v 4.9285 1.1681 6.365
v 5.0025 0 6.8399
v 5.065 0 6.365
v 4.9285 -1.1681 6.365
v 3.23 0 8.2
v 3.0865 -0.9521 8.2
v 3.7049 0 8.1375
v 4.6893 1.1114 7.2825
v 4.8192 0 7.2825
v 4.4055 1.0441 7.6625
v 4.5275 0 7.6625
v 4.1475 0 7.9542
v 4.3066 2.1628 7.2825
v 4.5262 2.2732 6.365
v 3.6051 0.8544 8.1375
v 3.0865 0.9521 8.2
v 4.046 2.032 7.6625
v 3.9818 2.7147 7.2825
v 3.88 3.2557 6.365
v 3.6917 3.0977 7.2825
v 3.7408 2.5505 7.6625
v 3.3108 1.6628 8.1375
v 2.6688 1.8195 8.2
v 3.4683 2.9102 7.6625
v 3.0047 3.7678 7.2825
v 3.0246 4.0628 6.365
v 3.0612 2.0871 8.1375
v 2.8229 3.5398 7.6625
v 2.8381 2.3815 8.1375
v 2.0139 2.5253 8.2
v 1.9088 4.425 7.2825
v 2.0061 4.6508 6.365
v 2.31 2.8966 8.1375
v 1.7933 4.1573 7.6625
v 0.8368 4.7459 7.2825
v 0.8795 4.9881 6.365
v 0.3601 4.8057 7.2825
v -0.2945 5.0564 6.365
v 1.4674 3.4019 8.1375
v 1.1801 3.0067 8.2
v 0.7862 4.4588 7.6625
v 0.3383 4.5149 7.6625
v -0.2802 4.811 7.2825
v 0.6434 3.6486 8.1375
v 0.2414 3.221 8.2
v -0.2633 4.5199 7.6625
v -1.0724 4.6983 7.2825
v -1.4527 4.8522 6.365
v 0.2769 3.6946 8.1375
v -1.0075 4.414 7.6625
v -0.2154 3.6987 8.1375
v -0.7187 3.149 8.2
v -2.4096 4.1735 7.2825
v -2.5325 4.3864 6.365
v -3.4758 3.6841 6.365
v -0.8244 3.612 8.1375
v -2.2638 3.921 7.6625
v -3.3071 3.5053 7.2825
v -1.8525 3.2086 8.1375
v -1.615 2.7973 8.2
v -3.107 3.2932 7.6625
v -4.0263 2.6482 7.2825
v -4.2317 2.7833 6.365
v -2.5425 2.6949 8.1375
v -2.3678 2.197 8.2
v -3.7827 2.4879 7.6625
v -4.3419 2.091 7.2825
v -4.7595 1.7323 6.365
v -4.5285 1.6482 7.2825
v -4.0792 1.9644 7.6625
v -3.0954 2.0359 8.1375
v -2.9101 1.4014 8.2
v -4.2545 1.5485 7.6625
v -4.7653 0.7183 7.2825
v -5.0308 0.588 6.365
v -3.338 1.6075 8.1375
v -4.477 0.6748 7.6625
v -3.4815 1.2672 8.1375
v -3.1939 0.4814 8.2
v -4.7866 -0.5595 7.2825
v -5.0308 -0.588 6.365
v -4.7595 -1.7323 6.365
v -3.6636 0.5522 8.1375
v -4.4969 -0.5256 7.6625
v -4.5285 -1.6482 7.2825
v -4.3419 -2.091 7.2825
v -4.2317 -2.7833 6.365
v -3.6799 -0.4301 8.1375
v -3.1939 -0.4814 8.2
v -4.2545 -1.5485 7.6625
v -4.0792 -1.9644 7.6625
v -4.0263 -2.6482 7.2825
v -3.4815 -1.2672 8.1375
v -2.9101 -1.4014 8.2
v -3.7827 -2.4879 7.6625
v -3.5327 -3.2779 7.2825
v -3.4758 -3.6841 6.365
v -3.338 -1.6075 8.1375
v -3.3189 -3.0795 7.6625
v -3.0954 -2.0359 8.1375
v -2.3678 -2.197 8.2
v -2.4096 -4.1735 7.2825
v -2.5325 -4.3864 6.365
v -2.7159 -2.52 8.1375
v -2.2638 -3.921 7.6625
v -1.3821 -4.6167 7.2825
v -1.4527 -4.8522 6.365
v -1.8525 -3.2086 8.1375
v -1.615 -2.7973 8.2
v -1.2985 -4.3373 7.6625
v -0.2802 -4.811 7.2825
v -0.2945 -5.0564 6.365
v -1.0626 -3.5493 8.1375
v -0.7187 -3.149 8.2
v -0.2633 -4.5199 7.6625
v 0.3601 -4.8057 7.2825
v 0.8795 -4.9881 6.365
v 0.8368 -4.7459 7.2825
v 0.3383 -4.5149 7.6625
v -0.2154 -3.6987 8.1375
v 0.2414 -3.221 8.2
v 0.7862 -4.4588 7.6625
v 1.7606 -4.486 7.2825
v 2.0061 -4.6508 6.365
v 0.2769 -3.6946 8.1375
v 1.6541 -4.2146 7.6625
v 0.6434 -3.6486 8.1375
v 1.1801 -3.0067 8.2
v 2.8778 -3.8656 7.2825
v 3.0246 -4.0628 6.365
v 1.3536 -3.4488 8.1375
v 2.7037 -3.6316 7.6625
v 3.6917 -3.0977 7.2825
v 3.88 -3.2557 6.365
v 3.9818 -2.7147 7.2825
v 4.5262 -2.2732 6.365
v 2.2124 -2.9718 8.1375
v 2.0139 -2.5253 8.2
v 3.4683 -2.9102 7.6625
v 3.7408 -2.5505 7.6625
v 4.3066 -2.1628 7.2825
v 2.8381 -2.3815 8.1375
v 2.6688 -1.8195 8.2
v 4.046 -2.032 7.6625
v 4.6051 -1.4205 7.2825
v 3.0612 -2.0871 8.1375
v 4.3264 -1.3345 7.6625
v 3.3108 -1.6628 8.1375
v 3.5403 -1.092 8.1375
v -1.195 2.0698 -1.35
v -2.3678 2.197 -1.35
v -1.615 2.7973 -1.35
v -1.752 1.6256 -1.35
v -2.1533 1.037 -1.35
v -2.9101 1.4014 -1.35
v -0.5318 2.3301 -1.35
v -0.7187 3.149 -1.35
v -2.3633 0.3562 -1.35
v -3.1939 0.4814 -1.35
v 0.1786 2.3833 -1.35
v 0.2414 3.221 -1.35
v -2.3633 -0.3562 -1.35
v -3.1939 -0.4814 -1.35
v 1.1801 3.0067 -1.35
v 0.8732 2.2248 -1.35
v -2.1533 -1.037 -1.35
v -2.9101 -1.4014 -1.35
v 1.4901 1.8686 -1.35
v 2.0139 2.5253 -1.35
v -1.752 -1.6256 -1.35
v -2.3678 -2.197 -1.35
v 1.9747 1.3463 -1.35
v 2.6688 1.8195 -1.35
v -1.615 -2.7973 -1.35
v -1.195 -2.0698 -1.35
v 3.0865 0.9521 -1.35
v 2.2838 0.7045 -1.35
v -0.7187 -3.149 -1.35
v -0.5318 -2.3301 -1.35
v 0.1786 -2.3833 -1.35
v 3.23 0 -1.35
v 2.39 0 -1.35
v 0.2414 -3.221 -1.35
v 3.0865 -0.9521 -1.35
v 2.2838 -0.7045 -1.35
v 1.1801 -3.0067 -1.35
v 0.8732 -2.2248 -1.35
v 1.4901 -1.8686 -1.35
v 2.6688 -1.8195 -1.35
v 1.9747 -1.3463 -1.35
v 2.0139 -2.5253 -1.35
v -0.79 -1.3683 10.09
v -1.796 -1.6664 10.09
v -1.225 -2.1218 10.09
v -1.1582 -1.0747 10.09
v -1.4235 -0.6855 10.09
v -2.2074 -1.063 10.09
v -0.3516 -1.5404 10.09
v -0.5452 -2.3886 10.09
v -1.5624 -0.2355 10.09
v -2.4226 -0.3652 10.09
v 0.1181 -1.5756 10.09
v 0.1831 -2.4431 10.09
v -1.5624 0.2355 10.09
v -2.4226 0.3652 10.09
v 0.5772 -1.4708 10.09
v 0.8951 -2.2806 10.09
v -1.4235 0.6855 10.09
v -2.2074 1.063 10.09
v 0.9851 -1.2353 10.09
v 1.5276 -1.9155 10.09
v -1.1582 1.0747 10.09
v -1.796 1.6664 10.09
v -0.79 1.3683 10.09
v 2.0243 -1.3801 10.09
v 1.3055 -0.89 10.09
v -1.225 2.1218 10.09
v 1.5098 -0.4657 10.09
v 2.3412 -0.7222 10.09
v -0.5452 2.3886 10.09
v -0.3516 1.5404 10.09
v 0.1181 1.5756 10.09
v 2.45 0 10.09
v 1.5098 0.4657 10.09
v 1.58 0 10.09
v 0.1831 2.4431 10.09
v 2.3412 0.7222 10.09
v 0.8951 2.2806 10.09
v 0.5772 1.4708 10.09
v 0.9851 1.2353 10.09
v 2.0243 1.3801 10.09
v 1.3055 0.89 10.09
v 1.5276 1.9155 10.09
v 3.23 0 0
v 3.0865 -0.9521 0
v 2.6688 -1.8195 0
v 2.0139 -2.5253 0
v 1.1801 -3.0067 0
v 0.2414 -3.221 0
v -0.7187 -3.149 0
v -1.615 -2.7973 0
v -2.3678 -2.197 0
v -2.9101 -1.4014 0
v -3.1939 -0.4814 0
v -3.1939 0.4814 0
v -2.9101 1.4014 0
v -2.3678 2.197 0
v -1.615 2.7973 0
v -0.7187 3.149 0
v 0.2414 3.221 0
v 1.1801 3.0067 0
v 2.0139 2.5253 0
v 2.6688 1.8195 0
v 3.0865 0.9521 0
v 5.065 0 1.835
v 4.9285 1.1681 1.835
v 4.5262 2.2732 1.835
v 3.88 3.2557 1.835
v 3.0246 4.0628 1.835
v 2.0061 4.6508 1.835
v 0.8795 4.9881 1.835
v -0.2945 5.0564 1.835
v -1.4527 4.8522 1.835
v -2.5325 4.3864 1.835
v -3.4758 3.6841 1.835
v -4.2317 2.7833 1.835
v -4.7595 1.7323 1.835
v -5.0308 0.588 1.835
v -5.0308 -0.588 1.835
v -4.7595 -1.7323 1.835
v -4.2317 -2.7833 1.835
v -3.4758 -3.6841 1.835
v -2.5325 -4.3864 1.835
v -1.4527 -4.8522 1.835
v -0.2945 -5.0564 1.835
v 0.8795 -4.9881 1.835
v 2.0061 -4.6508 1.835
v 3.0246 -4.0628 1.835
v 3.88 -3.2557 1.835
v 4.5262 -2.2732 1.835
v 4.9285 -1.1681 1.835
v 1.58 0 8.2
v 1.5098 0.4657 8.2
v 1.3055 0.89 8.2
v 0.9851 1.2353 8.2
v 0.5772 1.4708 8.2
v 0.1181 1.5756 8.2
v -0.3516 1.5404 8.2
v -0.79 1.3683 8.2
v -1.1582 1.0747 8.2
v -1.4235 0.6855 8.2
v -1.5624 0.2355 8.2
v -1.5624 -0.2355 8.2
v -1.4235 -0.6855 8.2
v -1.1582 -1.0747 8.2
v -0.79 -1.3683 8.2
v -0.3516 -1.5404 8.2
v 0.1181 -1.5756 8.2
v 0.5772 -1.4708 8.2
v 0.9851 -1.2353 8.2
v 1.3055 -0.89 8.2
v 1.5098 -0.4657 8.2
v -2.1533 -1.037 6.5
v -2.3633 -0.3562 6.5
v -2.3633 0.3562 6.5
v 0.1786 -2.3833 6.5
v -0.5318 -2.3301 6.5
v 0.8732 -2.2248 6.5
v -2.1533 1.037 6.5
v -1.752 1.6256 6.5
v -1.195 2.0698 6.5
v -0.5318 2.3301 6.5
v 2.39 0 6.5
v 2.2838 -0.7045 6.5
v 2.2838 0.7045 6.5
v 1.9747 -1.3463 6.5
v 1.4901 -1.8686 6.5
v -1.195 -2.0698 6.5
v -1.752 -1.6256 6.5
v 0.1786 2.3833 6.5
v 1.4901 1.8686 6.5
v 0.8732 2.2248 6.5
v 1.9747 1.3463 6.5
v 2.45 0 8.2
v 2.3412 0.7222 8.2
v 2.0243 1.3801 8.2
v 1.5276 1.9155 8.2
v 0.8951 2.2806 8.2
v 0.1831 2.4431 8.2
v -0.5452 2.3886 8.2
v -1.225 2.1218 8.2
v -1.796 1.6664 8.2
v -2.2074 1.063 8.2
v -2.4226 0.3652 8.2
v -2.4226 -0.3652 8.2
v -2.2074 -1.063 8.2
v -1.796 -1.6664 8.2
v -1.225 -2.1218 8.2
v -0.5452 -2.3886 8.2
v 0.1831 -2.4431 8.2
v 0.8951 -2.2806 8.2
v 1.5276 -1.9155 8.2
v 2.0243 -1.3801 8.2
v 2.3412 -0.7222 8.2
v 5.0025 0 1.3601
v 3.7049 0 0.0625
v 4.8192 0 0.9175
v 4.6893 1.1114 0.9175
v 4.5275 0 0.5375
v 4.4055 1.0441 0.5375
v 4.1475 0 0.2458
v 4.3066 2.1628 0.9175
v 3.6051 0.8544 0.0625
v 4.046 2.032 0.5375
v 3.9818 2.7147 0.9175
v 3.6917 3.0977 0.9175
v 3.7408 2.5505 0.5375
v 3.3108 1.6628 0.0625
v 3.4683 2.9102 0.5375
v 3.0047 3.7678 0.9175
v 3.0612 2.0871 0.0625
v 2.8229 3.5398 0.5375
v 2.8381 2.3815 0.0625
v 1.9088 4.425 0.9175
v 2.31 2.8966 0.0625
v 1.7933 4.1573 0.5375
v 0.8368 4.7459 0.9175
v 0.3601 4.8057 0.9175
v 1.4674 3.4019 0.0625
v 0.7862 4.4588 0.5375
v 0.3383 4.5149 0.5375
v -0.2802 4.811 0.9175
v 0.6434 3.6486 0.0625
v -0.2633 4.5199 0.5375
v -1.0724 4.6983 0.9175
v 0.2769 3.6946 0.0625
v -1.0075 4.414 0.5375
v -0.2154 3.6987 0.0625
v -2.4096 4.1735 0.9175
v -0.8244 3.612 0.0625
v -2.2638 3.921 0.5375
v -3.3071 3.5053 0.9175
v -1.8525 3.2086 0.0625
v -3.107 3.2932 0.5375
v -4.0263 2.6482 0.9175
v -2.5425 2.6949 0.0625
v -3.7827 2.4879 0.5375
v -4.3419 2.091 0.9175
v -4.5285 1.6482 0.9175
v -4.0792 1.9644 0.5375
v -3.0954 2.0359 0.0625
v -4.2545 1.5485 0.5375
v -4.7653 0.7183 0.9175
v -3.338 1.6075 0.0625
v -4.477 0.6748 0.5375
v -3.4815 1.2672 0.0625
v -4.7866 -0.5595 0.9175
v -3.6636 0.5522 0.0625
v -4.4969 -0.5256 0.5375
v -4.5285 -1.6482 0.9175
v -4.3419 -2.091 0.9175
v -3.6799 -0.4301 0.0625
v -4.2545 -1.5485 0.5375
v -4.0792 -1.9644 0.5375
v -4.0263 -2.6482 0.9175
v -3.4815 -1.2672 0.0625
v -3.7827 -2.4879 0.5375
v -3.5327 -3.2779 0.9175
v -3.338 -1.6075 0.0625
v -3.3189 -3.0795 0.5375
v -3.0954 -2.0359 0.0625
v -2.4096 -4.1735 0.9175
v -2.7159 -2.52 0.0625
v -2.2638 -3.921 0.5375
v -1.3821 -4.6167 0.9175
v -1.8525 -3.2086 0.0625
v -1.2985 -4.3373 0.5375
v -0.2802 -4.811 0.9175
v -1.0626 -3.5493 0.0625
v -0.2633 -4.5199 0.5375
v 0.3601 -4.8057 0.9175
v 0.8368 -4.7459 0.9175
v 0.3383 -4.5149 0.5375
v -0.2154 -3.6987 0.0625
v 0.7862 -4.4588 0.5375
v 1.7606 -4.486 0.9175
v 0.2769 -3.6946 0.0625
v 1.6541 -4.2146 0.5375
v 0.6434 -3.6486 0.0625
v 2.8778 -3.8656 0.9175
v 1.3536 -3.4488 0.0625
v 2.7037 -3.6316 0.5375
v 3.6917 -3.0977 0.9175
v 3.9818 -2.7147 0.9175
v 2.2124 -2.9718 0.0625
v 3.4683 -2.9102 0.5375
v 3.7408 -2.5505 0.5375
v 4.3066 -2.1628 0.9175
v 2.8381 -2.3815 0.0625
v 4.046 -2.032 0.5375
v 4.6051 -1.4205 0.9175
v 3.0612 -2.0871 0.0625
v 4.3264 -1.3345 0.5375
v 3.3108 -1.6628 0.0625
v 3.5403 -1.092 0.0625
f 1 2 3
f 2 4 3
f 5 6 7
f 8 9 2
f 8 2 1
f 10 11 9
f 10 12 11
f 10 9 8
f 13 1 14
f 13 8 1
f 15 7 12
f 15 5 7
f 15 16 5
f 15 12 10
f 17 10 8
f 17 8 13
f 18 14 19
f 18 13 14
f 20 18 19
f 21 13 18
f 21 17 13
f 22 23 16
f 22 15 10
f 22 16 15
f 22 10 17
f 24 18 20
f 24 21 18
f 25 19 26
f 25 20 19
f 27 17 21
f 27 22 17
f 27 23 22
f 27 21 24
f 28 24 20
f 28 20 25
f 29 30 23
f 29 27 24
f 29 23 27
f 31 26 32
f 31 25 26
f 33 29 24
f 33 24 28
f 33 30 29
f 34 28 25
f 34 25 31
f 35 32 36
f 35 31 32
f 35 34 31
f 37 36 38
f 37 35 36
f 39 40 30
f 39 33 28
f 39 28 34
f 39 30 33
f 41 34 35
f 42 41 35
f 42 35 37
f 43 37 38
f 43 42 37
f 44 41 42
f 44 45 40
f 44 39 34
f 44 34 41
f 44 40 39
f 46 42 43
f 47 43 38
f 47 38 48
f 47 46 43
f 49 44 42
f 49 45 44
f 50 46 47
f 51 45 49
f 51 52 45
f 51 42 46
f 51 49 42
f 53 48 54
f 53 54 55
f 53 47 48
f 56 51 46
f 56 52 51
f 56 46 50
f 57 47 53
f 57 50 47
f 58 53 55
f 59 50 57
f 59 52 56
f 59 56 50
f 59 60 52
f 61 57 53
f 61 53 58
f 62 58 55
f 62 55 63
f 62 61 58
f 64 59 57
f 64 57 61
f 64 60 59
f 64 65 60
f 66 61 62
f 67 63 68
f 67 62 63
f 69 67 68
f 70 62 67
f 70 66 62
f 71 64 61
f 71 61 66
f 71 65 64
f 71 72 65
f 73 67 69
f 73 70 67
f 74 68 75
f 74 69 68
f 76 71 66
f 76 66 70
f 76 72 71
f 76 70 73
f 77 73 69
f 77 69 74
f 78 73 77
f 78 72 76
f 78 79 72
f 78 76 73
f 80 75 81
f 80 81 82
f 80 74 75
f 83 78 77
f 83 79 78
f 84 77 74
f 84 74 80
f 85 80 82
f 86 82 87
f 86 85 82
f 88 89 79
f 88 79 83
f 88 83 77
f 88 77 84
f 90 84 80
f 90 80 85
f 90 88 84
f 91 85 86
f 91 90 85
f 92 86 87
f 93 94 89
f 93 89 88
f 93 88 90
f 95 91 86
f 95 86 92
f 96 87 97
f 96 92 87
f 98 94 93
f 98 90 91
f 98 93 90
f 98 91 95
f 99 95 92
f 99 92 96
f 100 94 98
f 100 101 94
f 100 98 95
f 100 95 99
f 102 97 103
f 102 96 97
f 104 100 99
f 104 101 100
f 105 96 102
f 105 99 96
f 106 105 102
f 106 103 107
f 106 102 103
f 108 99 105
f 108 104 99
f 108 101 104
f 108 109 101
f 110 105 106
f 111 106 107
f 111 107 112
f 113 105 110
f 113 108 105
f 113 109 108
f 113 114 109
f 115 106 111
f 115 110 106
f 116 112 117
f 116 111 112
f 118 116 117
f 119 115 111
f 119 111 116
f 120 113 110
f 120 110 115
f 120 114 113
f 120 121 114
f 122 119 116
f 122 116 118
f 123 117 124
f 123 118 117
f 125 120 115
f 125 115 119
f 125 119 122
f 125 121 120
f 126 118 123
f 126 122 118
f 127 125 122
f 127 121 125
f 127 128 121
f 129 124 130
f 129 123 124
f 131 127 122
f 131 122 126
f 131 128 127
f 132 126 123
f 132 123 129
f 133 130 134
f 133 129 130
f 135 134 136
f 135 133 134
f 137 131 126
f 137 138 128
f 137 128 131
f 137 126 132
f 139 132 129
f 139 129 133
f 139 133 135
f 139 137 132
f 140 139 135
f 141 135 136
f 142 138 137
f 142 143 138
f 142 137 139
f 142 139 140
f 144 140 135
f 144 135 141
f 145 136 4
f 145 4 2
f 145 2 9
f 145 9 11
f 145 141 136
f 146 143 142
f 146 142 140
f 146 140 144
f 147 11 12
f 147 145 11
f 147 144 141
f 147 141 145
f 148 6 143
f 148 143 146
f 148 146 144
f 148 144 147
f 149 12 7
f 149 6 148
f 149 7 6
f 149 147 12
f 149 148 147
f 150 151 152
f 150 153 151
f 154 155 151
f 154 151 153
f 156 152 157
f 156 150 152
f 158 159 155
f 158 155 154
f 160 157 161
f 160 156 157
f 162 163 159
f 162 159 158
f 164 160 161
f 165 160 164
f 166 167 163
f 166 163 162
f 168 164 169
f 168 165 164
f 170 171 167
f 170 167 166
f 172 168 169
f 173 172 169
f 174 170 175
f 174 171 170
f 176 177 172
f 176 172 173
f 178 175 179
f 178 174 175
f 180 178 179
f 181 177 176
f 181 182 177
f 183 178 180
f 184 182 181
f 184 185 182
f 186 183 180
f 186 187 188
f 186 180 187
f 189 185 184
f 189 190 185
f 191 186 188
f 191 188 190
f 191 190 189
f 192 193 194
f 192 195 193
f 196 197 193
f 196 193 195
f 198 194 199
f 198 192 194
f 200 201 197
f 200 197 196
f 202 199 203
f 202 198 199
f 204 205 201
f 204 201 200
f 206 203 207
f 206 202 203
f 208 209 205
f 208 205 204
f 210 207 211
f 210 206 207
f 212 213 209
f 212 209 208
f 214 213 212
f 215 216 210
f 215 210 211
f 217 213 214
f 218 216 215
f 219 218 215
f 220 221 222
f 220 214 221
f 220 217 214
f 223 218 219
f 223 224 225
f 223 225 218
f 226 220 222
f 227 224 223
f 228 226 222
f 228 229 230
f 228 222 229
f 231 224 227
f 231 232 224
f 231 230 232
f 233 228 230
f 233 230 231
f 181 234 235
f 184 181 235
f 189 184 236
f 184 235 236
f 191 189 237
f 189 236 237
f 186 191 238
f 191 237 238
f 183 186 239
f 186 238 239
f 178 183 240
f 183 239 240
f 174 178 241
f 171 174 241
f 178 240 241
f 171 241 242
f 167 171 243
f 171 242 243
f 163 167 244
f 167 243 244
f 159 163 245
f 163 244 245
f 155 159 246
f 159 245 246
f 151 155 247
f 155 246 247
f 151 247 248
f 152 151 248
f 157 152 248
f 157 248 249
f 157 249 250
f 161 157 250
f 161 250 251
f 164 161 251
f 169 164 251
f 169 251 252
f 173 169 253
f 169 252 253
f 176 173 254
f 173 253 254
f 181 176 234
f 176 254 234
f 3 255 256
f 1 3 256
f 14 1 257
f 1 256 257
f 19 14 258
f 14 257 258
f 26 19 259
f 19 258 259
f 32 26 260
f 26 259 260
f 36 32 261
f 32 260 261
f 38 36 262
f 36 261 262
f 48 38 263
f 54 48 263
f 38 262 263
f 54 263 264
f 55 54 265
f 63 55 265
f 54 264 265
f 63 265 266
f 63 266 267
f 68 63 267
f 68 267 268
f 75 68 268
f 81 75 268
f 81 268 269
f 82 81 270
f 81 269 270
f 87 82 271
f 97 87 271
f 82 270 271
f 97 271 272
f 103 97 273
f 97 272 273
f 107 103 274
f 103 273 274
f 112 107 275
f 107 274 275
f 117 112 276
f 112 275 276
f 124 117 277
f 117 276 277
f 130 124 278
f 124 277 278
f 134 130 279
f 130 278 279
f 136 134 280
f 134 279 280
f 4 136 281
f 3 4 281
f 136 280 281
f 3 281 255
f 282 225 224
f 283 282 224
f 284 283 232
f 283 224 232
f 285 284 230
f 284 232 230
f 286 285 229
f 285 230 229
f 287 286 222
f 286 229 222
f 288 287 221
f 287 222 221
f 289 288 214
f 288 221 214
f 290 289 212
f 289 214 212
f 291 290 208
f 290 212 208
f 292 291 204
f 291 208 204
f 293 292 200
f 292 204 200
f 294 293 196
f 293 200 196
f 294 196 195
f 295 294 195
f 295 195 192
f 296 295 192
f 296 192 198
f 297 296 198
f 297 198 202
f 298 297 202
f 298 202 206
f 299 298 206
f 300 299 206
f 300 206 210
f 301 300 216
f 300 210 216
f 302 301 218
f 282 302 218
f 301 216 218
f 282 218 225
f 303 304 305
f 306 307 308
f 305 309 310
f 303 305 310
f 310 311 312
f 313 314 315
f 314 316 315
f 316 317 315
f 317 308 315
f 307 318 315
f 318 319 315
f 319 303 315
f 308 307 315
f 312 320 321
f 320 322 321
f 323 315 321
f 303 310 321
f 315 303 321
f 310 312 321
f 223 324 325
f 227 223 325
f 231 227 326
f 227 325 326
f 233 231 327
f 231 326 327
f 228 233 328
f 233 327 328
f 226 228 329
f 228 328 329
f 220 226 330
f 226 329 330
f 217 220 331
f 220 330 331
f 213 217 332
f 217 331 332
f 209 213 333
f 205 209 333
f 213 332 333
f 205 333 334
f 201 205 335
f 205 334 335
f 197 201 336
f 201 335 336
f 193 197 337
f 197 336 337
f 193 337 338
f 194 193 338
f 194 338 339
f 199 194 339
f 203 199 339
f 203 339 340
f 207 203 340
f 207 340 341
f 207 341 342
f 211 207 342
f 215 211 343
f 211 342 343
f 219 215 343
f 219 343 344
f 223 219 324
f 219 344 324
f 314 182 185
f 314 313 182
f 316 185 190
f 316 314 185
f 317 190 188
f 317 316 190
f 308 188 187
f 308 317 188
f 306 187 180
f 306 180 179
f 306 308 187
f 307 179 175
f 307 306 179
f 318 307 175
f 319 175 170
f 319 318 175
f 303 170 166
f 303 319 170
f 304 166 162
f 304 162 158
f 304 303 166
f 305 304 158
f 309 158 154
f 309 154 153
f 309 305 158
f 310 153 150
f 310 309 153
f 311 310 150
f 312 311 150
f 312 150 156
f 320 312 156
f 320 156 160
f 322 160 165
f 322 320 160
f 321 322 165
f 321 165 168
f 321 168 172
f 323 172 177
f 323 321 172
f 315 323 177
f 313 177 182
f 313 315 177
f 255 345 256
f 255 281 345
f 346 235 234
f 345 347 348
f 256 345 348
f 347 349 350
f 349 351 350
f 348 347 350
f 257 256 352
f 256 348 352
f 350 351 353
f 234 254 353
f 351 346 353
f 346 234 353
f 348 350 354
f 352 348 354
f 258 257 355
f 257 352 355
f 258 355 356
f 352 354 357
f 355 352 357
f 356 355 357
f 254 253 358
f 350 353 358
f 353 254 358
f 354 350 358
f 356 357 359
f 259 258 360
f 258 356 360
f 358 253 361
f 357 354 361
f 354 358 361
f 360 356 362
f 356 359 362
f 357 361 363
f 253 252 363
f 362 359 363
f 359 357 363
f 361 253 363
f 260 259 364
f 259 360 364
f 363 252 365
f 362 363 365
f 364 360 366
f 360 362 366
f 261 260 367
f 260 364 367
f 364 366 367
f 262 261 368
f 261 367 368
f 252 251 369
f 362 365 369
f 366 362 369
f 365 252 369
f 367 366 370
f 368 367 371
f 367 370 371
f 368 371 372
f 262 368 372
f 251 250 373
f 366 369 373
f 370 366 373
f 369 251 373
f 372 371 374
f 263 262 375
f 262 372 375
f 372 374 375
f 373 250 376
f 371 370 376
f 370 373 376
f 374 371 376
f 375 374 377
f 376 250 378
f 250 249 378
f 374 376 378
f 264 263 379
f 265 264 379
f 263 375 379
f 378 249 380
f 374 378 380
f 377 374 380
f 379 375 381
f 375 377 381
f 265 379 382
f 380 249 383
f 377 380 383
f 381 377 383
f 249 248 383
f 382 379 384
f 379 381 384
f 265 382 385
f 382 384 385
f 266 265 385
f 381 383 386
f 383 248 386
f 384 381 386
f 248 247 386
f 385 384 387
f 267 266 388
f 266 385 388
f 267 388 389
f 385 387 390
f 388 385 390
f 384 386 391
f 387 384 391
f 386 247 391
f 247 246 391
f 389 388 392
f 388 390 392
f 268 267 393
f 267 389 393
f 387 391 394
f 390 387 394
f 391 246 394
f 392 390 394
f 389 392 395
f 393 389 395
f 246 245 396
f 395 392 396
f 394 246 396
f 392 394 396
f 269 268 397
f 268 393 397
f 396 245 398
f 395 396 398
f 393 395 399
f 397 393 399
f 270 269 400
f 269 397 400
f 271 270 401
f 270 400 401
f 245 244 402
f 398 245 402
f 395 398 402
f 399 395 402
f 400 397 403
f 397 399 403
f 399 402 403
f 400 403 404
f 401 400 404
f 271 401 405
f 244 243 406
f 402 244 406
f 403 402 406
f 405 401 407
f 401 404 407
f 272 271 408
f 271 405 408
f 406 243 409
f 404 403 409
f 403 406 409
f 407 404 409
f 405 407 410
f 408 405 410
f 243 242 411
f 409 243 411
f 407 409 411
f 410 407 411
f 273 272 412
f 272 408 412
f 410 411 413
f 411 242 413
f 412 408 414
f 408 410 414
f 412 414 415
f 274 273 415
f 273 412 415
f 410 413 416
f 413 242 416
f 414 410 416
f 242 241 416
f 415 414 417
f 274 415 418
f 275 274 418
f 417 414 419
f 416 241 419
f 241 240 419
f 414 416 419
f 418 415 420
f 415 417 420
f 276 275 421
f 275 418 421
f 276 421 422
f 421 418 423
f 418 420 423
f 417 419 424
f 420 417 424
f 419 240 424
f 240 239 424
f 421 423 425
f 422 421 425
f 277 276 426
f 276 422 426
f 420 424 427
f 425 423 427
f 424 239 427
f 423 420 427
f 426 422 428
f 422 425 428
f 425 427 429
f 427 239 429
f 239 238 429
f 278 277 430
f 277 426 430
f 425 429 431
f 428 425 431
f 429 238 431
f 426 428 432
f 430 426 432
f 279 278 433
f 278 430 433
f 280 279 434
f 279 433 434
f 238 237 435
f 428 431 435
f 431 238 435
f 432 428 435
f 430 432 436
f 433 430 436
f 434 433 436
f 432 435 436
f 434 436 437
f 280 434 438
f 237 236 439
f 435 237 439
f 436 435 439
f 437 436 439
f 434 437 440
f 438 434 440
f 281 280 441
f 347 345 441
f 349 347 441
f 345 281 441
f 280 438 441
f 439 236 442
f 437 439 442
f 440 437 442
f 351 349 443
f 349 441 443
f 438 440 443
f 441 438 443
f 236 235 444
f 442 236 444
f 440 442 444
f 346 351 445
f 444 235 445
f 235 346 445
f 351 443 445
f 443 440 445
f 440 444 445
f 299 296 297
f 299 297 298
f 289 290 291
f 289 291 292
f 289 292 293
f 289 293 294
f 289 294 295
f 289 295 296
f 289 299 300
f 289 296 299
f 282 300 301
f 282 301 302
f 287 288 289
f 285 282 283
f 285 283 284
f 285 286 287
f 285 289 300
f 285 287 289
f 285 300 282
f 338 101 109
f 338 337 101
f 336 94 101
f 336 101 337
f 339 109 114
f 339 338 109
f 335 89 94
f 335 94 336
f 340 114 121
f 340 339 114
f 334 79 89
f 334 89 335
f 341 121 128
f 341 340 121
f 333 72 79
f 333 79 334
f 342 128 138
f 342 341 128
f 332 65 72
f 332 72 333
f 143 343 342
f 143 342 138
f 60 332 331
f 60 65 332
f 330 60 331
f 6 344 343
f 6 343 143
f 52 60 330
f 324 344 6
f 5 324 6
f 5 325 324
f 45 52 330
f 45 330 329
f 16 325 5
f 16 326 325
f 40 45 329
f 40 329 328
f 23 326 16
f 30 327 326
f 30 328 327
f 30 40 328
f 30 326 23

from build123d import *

# Parameters (mm, degrees)
F0_R     = 5.065
F1_DEPTH = 8.2
F2_R     = 1.835
F3_R     = 2.45
F4_DEPTH = 1.89
F5_R     = 1.58
F6_DEPTH = 1.89
F7_R     = 3.23
F7_R_2   = 2.39
F8_DEPTH = 1.35
F9_DEPTH = 6.5


with BuildPart() as f1:
    # F0 (on Top) → F1 (new body)
    with BuildSketch(Plane.XY):
        Circle(F0_R)
    extrude(amount=F1_DEPTH)

    # F2
    f2_edges = [f1.edges().sort_by_distance(p)[0] for p in [
        (-5.065, 0, 8.2),
        (-5.065, 0, 0),
    ]]
    fillet(f2_edges, radius=F2_R)

    # F3 (on face) → F4 (join)
    with BuildSketch(Plane.XY.offset(8.2)):
        Circle(F3_R)
    extrude(amount=F4_DEPTH)

    # F5 (on face) → F6 (cut)
    with BuildSketch(Plane.XY.offset(10.09)):
        Circle(F5_R)
    extrude(amount=-F6_DEPTH, mode=Mode.SUBTRACT)

    # F7 (on face) → F8 (join)
    with BuildSketch(Plane(origin=(0, 0, 0), x_dir=(1, 0, 0), z_dir=(0, 0, -1))):
        Circle(F7_R)
        Circle(F7_R_2, mode=Mode.SUBTRACT)
    extrude(amount=F8_DEPTH)

    # F9 (cut): a face of the model
    f9_faces = [f1.faces().sort_by_distance(p)[0] for p in [
        (0, 0, 0),
    ]]
    extrude(f9_faces, amount=-F9_DEPTH, mode=Mode.SUBTRACT)


solid = f1.part
